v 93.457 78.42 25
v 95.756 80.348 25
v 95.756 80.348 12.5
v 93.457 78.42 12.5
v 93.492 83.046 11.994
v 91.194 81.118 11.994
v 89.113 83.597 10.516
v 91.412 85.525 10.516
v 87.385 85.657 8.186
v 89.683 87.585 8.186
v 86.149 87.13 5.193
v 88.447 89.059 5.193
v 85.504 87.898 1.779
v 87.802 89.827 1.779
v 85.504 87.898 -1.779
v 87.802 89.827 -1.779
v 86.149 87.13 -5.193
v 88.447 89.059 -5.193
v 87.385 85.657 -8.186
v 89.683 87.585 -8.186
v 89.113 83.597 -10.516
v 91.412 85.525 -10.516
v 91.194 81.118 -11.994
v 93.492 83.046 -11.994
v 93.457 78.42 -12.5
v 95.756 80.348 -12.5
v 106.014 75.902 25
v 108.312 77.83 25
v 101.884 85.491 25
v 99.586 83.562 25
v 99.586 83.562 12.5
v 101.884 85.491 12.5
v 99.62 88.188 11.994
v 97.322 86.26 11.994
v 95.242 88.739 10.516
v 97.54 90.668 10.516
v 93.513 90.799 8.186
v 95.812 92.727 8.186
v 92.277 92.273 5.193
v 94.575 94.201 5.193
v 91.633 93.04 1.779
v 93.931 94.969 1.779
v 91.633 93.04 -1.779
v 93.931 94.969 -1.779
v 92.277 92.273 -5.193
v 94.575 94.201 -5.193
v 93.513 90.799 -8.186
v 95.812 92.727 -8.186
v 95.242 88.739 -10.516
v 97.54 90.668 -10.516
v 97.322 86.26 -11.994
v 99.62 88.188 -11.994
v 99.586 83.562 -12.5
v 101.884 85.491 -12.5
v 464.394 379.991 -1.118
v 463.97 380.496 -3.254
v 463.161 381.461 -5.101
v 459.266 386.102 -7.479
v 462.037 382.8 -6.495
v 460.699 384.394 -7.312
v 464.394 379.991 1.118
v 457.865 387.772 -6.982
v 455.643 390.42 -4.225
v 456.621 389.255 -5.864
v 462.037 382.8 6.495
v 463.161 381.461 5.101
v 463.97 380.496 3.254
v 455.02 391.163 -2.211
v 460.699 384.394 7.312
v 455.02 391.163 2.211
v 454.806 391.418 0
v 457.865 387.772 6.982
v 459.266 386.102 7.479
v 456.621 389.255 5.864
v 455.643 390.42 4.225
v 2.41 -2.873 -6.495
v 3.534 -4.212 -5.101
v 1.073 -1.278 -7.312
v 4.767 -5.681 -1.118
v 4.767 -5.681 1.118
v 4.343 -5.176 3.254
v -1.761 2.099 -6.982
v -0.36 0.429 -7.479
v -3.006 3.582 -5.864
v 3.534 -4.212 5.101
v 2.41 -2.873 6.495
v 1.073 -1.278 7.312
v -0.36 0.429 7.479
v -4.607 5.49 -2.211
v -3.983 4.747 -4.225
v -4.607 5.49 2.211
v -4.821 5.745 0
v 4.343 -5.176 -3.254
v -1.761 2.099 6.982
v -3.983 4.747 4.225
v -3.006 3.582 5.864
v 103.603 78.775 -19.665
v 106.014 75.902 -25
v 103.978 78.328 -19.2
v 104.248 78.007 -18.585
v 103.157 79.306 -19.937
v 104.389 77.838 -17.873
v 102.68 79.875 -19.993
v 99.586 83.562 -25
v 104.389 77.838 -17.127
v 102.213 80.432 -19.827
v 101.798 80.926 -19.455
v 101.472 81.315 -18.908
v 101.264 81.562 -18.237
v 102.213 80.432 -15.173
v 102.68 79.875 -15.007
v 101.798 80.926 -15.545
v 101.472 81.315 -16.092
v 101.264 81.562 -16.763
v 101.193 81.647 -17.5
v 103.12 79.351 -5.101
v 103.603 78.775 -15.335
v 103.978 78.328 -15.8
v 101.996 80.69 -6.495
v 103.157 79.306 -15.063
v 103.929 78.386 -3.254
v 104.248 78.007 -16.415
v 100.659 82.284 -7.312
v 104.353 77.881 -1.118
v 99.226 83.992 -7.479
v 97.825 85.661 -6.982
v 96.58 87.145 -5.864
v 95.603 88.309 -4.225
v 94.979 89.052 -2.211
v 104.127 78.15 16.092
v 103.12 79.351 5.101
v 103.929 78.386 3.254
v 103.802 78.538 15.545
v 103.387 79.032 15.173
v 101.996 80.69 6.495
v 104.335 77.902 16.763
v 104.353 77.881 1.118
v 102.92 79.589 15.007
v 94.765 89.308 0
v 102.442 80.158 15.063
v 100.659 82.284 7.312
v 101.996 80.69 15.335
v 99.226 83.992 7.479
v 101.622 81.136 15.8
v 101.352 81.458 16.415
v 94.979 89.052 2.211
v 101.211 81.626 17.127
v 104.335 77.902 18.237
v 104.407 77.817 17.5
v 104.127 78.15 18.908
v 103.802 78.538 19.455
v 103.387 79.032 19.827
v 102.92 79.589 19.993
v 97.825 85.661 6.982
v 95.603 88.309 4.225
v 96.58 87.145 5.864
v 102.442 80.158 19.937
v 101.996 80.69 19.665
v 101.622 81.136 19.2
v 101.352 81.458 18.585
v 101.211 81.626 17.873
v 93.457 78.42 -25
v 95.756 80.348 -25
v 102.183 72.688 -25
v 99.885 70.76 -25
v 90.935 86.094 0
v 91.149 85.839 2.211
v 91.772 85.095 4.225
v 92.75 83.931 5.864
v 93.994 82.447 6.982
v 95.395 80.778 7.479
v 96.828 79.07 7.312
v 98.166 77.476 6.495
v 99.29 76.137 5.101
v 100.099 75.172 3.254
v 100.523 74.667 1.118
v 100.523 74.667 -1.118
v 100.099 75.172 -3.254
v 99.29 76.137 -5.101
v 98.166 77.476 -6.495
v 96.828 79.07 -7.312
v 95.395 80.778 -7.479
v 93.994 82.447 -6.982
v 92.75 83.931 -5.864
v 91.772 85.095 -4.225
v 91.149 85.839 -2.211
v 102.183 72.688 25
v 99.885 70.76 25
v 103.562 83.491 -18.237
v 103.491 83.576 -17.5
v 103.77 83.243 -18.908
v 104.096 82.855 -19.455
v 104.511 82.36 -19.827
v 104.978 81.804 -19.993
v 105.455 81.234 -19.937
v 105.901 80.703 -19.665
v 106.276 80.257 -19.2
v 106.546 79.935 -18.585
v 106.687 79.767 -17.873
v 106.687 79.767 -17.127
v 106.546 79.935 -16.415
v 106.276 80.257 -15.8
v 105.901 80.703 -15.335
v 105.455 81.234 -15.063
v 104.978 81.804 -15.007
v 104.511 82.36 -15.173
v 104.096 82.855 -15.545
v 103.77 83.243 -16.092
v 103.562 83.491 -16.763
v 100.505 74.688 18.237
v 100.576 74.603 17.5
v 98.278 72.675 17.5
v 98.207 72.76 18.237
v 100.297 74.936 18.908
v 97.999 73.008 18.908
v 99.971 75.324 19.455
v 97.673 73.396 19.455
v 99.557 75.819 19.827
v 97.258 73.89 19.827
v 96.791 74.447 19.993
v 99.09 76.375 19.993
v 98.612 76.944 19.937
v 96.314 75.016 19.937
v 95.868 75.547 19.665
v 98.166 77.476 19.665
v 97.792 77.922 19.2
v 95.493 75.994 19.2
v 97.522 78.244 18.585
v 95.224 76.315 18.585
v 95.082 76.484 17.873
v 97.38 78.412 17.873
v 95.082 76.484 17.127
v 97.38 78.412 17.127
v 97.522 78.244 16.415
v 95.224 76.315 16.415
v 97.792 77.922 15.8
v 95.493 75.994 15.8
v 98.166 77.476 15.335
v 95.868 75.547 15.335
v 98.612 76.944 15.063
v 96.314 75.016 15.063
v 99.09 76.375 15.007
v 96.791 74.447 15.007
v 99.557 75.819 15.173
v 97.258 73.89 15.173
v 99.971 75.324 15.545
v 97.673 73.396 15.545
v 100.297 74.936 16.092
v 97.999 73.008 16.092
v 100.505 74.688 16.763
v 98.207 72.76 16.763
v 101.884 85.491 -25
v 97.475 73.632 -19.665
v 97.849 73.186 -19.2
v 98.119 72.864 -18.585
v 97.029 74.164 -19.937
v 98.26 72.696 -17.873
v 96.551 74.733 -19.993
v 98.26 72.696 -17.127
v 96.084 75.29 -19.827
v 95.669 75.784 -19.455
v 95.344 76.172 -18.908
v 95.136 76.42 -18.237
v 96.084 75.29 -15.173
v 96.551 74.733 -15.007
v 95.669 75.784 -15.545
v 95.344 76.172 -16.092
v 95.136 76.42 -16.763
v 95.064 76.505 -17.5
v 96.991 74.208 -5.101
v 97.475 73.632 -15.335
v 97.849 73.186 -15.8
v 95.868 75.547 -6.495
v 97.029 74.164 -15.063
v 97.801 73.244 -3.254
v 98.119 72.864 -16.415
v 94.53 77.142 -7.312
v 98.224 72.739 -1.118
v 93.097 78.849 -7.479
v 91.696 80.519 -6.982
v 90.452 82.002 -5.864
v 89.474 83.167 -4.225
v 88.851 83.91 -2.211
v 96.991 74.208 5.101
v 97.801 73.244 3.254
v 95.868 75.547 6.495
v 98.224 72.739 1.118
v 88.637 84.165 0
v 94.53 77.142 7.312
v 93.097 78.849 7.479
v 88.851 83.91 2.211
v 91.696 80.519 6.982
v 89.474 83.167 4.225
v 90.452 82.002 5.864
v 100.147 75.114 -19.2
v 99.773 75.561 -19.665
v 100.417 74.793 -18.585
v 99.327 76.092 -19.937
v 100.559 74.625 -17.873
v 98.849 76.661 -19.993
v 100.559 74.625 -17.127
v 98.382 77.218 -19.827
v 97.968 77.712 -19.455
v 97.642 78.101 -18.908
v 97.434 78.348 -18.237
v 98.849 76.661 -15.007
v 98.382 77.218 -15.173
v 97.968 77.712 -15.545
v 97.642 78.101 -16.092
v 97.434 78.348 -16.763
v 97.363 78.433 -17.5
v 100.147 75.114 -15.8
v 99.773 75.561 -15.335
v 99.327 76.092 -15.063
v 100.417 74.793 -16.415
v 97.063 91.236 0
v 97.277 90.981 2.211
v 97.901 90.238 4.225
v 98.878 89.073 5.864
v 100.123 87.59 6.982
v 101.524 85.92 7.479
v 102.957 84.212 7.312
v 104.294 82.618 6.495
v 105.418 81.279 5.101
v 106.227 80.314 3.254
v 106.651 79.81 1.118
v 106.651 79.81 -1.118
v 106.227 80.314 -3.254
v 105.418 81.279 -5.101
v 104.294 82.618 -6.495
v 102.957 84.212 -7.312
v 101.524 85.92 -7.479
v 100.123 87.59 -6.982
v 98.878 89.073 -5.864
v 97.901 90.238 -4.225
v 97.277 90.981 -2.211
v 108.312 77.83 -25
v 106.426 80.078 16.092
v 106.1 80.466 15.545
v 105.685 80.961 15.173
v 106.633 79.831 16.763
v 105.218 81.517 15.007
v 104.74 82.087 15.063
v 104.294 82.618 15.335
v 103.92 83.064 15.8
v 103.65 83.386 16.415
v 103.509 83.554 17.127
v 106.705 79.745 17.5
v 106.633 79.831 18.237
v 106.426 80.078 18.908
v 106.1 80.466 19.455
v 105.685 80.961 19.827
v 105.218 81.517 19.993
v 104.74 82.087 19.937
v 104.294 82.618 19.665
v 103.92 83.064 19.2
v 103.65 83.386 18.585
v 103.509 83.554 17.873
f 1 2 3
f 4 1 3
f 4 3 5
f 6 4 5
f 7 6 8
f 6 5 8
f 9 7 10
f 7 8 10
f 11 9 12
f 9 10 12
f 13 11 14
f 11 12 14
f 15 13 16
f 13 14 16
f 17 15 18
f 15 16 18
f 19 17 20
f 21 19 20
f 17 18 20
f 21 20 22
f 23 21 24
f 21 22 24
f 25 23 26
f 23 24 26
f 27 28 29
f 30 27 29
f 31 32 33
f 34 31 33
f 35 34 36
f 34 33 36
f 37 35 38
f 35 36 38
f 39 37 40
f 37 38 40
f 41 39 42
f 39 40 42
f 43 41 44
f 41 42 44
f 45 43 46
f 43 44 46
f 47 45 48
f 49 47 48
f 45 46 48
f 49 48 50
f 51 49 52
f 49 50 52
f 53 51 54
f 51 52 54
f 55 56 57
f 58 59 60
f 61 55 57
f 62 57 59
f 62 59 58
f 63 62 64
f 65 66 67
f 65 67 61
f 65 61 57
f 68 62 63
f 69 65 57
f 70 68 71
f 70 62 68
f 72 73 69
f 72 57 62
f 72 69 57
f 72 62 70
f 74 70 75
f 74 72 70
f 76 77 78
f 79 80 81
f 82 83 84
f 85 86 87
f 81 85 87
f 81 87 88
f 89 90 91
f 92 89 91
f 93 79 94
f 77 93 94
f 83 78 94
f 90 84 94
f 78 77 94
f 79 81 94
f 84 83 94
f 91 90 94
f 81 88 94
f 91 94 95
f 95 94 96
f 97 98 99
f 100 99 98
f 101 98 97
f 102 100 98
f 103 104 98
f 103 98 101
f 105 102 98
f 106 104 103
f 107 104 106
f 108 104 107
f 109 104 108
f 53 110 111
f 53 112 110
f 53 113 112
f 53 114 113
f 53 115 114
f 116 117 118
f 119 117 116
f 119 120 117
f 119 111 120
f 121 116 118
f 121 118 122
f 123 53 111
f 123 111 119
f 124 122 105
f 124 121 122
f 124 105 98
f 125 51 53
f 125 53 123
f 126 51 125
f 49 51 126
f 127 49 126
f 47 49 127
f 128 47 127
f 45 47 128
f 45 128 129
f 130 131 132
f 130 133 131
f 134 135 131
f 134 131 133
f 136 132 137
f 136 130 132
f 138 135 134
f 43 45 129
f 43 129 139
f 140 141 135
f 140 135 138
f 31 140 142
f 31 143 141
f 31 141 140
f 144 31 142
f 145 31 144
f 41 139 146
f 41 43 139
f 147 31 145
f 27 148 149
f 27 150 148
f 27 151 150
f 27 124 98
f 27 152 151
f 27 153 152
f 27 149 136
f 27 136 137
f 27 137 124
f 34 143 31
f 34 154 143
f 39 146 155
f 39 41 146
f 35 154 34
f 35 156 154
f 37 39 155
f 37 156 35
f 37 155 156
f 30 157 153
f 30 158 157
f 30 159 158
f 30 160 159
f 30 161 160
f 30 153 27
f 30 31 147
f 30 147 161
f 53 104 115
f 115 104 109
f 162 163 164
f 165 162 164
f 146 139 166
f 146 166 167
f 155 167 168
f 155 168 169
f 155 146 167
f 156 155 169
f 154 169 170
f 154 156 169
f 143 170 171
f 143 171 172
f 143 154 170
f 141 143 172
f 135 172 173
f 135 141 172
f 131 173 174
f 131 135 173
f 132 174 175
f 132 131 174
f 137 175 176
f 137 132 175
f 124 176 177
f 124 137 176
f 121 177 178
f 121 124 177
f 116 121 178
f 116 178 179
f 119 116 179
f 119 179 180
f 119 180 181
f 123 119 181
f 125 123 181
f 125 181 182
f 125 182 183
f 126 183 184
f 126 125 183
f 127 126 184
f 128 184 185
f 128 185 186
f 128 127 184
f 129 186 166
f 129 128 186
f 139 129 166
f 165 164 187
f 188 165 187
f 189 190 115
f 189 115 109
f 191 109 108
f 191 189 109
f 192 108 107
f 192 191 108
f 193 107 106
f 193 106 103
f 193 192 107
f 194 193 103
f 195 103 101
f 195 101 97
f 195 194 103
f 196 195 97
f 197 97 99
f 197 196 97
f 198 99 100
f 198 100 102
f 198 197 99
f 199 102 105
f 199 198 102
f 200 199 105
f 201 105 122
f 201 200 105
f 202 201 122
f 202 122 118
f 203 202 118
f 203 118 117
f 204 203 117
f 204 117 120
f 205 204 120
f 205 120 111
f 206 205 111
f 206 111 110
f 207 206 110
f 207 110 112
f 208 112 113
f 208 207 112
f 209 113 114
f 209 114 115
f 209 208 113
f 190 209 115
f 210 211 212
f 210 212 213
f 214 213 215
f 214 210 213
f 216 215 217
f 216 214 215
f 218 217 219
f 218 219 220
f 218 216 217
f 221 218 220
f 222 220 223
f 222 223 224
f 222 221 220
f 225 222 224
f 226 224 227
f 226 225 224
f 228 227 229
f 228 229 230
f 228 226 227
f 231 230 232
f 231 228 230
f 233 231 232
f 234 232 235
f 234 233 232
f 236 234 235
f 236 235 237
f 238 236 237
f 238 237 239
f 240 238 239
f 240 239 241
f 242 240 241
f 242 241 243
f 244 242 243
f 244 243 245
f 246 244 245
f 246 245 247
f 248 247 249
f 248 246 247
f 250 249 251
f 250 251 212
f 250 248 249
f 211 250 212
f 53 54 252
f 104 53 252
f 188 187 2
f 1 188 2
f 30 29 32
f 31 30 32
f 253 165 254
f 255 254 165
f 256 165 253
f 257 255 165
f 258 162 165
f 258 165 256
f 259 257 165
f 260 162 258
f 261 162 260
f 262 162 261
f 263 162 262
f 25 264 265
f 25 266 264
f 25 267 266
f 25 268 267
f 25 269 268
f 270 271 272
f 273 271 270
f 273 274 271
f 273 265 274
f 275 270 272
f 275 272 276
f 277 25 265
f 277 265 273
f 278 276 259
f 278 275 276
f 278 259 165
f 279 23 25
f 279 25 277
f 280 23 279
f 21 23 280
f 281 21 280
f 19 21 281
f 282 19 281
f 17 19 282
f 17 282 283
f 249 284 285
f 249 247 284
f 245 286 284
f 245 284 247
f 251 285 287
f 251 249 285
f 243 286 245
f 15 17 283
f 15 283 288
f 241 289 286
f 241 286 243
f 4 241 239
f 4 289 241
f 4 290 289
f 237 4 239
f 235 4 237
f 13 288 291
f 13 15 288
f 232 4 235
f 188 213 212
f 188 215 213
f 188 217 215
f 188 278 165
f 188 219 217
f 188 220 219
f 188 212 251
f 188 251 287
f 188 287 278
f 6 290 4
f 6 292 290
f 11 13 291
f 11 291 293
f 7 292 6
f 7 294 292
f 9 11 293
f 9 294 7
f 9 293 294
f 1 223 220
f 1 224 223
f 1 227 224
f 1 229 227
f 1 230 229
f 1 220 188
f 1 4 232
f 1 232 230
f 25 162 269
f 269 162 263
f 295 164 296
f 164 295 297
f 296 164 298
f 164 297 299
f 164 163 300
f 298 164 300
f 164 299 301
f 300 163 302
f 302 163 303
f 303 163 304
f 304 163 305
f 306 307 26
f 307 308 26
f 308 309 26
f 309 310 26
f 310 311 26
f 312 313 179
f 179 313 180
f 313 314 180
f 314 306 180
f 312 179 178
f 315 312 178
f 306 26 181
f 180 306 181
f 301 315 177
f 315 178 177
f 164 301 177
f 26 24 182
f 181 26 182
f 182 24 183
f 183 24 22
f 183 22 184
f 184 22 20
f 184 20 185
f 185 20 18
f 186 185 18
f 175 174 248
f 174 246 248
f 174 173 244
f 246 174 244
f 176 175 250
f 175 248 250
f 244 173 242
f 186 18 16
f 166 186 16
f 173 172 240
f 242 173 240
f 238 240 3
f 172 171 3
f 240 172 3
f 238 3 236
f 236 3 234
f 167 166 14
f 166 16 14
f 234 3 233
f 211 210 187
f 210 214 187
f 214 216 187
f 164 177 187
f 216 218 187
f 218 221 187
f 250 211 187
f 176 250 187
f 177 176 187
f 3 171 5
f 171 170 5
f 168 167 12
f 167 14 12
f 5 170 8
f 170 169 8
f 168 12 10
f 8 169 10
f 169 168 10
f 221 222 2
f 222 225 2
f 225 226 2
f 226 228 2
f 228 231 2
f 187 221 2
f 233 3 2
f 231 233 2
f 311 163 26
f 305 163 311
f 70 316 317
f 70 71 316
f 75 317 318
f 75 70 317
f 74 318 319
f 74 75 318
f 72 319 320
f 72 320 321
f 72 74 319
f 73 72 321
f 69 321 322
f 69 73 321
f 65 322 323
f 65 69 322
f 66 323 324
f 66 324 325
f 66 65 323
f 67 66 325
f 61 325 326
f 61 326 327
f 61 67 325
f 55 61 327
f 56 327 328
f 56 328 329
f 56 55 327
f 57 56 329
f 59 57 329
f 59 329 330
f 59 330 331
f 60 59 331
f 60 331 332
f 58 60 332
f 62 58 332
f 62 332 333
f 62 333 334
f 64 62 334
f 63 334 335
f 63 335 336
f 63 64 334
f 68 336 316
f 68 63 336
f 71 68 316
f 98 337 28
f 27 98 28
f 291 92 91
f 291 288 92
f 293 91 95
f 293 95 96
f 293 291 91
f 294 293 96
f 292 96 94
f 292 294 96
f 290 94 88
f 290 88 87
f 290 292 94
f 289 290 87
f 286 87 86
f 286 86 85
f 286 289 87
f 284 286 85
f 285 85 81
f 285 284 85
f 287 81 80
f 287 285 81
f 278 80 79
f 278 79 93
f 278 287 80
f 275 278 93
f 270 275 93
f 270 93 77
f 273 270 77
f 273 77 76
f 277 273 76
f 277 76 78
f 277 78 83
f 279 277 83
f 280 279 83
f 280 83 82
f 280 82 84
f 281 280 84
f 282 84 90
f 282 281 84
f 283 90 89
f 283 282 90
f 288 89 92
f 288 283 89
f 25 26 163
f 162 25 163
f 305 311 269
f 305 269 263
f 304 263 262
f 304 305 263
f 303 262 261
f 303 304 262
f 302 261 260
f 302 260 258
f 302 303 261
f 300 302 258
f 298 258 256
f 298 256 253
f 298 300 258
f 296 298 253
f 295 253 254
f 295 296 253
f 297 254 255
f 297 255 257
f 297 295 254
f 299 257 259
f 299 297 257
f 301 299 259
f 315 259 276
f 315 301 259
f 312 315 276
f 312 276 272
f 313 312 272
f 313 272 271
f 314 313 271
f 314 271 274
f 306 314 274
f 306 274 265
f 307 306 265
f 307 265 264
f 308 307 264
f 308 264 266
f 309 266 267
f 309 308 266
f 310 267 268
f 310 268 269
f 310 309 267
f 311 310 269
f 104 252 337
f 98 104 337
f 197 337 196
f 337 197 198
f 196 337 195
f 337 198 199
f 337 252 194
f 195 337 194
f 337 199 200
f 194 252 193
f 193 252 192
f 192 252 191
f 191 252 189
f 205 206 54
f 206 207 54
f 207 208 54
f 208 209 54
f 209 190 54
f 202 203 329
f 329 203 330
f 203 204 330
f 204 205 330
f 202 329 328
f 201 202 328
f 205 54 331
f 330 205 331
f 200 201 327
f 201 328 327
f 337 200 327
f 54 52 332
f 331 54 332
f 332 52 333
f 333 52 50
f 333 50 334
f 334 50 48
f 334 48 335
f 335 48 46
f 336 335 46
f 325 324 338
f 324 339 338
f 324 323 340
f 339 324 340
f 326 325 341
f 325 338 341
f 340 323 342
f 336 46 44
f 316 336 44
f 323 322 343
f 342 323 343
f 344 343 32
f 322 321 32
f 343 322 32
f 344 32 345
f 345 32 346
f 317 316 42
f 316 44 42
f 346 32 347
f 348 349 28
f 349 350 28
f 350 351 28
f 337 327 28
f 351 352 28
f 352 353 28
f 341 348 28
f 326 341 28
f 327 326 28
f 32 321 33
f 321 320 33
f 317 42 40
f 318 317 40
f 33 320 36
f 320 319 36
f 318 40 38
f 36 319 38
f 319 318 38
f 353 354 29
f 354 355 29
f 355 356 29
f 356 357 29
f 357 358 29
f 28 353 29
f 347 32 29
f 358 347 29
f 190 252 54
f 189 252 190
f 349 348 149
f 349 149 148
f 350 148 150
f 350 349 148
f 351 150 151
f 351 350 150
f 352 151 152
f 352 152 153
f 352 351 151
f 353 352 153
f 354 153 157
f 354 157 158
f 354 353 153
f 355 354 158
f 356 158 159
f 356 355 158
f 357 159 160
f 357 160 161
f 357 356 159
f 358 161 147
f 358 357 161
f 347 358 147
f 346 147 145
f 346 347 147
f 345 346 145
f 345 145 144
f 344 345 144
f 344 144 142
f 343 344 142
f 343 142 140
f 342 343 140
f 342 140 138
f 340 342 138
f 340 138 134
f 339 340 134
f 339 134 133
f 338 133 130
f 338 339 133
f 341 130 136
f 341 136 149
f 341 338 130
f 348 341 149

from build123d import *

# Parameters (mm, degrees)
S_P_R1_PROFILE_R            = 7.5
Y_KSEKLIK_EKSTR_ZYON1_START = -125
IZIM8_R                     = 2.5
Y_KSEKLIK_EKSTR_ZYON1_DEPTH = 3
Y_KSEKLIK_EKSTR_ZYON2_START = -133
IZIM8_3_R                   = 2.5
Y_KSEKLIK_EKSTR_ZYON2_DEPTH = 3


with BuildPart() as part:
    # Süpür1: sweep along a path in Çizim1
    with BuildLine(Plane.XY) as s_p_r1_path:
        Line((0, 0), (459.626665871, 385.672565812))
    # Süpür1 profile (on start of the path) → Süpür1 (sweep)
    with BuildSketch(Plane(origin=(0, 0, 0), x_dir=(-0.642787609686541, 0.7660444431189767, 0), z_dir=(0.7660444431189767, 0.642787609686541, 0))):
        Circle(S_P_R1_PROFILE_R)
    sweep(path=s_p_r1_path.line)

    # Çizim8 → Yükseklik-Ekstrüzyon1 (add)
    with BuildSketch(Plane(origin=(0, 0, 0), x_dir=(0, 0, 1), z_dir=(-0.7660444431189768, -0.642787609686541, 0)).offset(Y_KSEKLIK_EKSTR_ZYON1_START)):
        with BuildLine():
            Line((-25, -10), (25, -10))
            Line((25, -10), (25, 0))
            Line((25, 0), (12.5, 0))
            ThreePointArc((12.5, 0), (0, 12.5), (-12.5, 0))
            Line((-12.5, 0), (-25, 0))
            Line((-25, 0), (-25, -10))
        make_face()
        with Locations((17.5, -5)):
            Circle(IZIM8_R, mode=Mode.SUBTRACT)
        with Locations((-17.5, -5)):
            Circle(IZIM8_R, mode=Mode.SUBTRACT)
    extrude(amount=Y_KSEKLIK_EKSTR_ZYON1_DEPTH)

    # Çizim8<3> → Yükseklik-Ekstrüzyon2 (add)
    with BuildSketch(Plane(origin=(0, 0, 0), x_dir=(0, 0, 1), z_dir=(-0.7660444431189768, -0.642787609686541, 0)).offset(Y_KSEKLIK_EKSTR_ZYON2_START)):
        with BuildLine():
            Line((-25, -10), (25, -10))
            Line((25, -10), (25, 0))
            Line((25, 0), (12.5, 0))
            ThreePointArc((12.5, 0), (0, 12.5), (-12.5, 0))
            Line((-12.5, 0), (-25, 0))
            Line((-25, 0), (-25, -10))
        make_face()
        with Locations((17.5, -5)):
            Circle(IZIM8_3_R, mode=Mode.SUBTRACT)
        with Locations((-17.5, -5)):
            Circle(IZIM8_3_R, mode=Mode.SUBTRACT)
    extrude(amount=Y_KSEKLIK_EKSTR_ZYON2_DEPTH)


solid = part.part
